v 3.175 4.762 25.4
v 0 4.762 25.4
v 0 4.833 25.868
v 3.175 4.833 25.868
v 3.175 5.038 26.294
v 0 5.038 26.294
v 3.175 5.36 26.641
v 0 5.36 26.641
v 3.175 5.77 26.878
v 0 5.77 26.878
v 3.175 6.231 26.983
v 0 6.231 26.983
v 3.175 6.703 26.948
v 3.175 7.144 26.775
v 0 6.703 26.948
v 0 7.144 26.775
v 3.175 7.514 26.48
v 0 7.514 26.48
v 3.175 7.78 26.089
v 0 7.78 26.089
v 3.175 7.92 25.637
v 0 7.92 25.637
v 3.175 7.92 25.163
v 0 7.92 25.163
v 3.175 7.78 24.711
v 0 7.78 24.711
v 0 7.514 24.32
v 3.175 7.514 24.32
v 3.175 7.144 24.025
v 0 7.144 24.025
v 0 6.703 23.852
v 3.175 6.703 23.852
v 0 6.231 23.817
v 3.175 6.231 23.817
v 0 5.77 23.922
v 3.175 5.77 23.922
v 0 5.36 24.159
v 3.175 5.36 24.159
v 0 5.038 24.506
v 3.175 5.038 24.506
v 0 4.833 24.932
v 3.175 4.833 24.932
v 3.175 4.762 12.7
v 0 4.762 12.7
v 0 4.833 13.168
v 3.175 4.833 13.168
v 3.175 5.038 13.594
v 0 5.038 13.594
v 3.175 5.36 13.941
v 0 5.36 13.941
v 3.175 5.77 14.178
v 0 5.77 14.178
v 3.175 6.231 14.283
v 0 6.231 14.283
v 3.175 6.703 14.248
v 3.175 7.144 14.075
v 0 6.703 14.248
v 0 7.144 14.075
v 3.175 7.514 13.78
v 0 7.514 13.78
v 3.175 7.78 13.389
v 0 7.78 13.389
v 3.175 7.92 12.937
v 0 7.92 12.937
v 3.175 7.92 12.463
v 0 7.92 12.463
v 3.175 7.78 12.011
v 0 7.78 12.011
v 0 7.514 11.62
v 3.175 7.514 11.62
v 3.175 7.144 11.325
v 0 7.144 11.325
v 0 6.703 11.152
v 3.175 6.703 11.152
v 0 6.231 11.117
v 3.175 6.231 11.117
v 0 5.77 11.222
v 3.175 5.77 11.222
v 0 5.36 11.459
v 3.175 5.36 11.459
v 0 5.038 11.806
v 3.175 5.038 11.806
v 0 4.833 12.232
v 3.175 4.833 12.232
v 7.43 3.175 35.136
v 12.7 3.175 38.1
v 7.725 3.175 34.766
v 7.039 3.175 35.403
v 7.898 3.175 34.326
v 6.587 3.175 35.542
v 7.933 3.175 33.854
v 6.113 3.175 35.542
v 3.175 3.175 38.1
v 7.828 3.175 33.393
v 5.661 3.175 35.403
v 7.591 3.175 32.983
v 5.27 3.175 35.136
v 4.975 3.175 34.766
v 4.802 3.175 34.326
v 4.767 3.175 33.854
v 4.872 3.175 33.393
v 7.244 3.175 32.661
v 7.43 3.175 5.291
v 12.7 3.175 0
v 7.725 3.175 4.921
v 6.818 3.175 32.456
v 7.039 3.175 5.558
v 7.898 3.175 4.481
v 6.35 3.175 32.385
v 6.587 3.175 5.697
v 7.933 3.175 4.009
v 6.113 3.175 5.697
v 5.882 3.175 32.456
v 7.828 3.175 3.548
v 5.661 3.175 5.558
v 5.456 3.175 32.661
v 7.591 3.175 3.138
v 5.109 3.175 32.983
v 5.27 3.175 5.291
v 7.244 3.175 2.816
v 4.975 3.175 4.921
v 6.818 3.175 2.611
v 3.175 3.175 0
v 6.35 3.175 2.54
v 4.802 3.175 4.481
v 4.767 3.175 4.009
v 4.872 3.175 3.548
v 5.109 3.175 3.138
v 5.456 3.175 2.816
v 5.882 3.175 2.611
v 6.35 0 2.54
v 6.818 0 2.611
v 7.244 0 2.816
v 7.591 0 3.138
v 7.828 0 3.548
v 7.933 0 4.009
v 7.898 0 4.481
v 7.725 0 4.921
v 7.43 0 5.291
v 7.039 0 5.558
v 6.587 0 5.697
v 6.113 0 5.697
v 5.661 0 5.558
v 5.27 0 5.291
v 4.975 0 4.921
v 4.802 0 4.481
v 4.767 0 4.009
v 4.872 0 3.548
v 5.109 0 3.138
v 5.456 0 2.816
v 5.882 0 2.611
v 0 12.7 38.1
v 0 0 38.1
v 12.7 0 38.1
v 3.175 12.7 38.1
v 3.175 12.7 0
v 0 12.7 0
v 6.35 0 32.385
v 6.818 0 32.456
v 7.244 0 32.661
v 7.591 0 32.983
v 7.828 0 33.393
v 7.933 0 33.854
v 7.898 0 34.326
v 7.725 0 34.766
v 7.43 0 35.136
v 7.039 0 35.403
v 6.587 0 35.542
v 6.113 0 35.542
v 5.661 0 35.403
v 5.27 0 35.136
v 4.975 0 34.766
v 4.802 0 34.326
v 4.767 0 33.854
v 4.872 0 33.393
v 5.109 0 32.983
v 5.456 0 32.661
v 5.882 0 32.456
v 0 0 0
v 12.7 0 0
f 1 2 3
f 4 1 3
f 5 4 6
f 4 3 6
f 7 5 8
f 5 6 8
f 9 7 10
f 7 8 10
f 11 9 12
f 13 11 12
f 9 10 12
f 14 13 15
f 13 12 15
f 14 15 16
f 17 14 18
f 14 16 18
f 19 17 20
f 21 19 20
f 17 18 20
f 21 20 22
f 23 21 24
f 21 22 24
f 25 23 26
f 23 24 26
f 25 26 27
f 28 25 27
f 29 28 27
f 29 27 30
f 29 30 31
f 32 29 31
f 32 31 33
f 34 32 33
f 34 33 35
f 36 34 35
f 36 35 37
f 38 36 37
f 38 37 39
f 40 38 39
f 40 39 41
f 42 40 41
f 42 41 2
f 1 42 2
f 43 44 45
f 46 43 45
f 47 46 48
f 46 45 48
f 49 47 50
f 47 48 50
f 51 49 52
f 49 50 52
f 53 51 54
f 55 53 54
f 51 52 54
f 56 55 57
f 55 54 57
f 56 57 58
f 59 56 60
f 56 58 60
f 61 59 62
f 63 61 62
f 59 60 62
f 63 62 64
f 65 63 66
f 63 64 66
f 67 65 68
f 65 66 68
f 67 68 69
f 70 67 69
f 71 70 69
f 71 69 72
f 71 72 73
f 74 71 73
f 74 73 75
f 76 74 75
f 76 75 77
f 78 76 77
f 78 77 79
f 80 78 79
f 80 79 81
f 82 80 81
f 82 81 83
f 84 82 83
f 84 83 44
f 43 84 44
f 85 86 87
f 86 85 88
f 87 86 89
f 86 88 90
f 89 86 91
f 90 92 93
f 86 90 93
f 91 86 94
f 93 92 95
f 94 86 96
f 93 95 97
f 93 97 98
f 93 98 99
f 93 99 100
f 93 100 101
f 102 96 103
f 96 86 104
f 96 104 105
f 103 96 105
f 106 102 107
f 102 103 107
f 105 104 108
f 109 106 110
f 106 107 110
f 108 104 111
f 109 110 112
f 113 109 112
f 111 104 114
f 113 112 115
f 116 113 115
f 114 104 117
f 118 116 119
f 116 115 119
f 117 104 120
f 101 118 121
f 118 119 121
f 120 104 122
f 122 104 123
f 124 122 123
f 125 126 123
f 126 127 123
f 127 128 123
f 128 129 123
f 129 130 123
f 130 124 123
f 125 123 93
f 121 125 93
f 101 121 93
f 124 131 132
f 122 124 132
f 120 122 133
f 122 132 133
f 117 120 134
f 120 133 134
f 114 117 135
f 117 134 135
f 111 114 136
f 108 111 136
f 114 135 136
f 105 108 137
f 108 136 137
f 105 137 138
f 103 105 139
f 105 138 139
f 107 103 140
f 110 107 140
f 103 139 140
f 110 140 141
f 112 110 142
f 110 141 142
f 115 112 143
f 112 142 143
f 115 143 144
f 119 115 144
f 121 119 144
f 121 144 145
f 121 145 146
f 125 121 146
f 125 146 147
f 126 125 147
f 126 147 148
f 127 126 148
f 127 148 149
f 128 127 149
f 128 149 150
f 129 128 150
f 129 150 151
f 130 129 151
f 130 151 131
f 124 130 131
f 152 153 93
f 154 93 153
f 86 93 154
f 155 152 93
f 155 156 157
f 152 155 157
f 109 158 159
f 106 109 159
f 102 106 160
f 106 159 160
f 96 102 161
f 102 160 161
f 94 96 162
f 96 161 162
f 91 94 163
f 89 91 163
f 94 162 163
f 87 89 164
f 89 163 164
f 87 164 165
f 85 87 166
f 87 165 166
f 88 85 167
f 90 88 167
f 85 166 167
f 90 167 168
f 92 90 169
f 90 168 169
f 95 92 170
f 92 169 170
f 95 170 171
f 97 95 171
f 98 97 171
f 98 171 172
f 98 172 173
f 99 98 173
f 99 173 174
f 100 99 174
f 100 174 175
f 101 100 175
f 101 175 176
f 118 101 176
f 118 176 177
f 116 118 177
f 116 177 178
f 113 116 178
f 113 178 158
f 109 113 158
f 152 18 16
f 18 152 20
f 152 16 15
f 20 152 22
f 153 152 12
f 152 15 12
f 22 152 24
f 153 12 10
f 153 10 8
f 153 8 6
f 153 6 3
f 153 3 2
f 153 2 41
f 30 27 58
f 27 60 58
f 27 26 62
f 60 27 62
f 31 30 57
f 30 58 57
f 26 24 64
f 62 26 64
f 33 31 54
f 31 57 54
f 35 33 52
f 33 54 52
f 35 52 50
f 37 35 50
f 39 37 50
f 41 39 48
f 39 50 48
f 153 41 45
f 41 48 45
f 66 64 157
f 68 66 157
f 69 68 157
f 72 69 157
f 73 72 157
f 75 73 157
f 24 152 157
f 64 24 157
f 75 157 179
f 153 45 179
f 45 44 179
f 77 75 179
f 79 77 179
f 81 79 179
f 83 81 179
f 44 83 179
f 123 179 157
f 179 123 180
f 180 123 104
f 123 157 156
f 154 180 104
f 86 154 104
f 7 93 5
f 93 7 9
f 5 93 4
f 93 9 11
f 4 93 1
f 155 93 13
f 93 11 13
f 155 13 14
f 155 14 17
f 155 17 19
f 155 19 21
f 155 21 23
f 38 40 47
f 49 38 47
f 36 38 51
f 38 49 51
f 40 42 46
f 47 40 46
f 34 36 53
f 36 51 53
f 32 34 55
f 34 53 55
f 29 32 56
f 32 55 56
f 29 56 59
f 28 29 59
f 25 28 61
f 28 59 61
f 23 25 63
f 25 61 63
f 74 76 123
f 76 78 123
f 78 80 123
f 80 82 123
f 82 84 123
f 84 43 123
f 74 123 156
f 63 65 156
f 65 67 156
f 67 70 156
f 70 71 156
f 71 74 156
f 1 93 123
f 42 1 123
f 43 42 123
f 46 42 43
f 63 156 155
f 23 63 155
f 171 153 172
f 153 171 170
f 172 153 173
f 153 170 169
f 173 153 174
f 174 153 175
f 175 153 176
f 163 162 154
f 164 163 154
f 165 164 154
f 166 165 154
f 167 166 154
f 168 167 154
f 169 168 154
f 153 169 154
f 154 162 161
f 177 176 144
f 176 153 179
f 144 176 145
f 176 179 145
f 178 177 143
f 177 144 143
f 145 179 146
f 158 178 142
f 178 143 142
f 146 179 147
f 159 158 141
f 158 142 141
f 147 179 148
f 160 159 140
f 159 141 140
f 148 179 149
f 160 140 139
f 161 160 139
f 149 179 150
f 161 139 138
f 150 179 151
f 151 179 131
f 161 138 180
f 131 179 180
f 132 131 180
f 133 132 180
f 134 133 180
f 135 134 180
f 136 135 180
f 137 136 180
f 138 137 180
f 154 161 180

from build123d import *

# Parameters (mm, degrees)
BOSS_EXTRUDE1_DEPTH = 38.1
SKETCH2_R           = 1.5875
CUT_EXTRUDE1_DEPTH  = 43.121134838
SKETCH3_R           = 1.5875
CUT_EXTRUDE2_DEPTH  = 43.121134838


with BuildPart() as part:
    # Sketch1 → Boss-Extrude1 (new body)
    with BuildSketch(Plane.XY):
        Polygon((0, 12.7), (0, 0), (12.7, 0), (12.7, 3.175), (3.175, 3.175), (3.175, 12.7), align=None)
    extrude(amount=BOSS_EXTRUDE1_DEPTH)

    # Sketch2 → Cut-Extrude1 (cut, through all)
    with BuildSketch(Plane.ZY):
        with Locations(Location((12.7, 6.35, 0), (0, 0, 270))):
            Circle(SKETCH2_R)
        with Locations(Location((25.4, 6.35, 0), (0, 0, 270))):
            Circle(SKETCH2_R)
    extrude(amount=-CUT_EXTRUDE1_DEPTH, mode=Mode.SUBTRACT)

    # Sketch3 → Cut-Extrude2 (cut, through all)
    with BuildSketch(Plane.XZ):
        with Locations(Location((6.35, 4.1275, 0), (0, 0, 270))):
            Circle(SKETCH3_R)
        with Locations(Location((6.35, 33.9725, 0), (0, 0, 270))):
            Circle(SKETCH3_R)
    extrude(amount=-CUT_EXTRUDE2_DEPTH, mode=Mode.SUBTRACT)


solid = part.part
